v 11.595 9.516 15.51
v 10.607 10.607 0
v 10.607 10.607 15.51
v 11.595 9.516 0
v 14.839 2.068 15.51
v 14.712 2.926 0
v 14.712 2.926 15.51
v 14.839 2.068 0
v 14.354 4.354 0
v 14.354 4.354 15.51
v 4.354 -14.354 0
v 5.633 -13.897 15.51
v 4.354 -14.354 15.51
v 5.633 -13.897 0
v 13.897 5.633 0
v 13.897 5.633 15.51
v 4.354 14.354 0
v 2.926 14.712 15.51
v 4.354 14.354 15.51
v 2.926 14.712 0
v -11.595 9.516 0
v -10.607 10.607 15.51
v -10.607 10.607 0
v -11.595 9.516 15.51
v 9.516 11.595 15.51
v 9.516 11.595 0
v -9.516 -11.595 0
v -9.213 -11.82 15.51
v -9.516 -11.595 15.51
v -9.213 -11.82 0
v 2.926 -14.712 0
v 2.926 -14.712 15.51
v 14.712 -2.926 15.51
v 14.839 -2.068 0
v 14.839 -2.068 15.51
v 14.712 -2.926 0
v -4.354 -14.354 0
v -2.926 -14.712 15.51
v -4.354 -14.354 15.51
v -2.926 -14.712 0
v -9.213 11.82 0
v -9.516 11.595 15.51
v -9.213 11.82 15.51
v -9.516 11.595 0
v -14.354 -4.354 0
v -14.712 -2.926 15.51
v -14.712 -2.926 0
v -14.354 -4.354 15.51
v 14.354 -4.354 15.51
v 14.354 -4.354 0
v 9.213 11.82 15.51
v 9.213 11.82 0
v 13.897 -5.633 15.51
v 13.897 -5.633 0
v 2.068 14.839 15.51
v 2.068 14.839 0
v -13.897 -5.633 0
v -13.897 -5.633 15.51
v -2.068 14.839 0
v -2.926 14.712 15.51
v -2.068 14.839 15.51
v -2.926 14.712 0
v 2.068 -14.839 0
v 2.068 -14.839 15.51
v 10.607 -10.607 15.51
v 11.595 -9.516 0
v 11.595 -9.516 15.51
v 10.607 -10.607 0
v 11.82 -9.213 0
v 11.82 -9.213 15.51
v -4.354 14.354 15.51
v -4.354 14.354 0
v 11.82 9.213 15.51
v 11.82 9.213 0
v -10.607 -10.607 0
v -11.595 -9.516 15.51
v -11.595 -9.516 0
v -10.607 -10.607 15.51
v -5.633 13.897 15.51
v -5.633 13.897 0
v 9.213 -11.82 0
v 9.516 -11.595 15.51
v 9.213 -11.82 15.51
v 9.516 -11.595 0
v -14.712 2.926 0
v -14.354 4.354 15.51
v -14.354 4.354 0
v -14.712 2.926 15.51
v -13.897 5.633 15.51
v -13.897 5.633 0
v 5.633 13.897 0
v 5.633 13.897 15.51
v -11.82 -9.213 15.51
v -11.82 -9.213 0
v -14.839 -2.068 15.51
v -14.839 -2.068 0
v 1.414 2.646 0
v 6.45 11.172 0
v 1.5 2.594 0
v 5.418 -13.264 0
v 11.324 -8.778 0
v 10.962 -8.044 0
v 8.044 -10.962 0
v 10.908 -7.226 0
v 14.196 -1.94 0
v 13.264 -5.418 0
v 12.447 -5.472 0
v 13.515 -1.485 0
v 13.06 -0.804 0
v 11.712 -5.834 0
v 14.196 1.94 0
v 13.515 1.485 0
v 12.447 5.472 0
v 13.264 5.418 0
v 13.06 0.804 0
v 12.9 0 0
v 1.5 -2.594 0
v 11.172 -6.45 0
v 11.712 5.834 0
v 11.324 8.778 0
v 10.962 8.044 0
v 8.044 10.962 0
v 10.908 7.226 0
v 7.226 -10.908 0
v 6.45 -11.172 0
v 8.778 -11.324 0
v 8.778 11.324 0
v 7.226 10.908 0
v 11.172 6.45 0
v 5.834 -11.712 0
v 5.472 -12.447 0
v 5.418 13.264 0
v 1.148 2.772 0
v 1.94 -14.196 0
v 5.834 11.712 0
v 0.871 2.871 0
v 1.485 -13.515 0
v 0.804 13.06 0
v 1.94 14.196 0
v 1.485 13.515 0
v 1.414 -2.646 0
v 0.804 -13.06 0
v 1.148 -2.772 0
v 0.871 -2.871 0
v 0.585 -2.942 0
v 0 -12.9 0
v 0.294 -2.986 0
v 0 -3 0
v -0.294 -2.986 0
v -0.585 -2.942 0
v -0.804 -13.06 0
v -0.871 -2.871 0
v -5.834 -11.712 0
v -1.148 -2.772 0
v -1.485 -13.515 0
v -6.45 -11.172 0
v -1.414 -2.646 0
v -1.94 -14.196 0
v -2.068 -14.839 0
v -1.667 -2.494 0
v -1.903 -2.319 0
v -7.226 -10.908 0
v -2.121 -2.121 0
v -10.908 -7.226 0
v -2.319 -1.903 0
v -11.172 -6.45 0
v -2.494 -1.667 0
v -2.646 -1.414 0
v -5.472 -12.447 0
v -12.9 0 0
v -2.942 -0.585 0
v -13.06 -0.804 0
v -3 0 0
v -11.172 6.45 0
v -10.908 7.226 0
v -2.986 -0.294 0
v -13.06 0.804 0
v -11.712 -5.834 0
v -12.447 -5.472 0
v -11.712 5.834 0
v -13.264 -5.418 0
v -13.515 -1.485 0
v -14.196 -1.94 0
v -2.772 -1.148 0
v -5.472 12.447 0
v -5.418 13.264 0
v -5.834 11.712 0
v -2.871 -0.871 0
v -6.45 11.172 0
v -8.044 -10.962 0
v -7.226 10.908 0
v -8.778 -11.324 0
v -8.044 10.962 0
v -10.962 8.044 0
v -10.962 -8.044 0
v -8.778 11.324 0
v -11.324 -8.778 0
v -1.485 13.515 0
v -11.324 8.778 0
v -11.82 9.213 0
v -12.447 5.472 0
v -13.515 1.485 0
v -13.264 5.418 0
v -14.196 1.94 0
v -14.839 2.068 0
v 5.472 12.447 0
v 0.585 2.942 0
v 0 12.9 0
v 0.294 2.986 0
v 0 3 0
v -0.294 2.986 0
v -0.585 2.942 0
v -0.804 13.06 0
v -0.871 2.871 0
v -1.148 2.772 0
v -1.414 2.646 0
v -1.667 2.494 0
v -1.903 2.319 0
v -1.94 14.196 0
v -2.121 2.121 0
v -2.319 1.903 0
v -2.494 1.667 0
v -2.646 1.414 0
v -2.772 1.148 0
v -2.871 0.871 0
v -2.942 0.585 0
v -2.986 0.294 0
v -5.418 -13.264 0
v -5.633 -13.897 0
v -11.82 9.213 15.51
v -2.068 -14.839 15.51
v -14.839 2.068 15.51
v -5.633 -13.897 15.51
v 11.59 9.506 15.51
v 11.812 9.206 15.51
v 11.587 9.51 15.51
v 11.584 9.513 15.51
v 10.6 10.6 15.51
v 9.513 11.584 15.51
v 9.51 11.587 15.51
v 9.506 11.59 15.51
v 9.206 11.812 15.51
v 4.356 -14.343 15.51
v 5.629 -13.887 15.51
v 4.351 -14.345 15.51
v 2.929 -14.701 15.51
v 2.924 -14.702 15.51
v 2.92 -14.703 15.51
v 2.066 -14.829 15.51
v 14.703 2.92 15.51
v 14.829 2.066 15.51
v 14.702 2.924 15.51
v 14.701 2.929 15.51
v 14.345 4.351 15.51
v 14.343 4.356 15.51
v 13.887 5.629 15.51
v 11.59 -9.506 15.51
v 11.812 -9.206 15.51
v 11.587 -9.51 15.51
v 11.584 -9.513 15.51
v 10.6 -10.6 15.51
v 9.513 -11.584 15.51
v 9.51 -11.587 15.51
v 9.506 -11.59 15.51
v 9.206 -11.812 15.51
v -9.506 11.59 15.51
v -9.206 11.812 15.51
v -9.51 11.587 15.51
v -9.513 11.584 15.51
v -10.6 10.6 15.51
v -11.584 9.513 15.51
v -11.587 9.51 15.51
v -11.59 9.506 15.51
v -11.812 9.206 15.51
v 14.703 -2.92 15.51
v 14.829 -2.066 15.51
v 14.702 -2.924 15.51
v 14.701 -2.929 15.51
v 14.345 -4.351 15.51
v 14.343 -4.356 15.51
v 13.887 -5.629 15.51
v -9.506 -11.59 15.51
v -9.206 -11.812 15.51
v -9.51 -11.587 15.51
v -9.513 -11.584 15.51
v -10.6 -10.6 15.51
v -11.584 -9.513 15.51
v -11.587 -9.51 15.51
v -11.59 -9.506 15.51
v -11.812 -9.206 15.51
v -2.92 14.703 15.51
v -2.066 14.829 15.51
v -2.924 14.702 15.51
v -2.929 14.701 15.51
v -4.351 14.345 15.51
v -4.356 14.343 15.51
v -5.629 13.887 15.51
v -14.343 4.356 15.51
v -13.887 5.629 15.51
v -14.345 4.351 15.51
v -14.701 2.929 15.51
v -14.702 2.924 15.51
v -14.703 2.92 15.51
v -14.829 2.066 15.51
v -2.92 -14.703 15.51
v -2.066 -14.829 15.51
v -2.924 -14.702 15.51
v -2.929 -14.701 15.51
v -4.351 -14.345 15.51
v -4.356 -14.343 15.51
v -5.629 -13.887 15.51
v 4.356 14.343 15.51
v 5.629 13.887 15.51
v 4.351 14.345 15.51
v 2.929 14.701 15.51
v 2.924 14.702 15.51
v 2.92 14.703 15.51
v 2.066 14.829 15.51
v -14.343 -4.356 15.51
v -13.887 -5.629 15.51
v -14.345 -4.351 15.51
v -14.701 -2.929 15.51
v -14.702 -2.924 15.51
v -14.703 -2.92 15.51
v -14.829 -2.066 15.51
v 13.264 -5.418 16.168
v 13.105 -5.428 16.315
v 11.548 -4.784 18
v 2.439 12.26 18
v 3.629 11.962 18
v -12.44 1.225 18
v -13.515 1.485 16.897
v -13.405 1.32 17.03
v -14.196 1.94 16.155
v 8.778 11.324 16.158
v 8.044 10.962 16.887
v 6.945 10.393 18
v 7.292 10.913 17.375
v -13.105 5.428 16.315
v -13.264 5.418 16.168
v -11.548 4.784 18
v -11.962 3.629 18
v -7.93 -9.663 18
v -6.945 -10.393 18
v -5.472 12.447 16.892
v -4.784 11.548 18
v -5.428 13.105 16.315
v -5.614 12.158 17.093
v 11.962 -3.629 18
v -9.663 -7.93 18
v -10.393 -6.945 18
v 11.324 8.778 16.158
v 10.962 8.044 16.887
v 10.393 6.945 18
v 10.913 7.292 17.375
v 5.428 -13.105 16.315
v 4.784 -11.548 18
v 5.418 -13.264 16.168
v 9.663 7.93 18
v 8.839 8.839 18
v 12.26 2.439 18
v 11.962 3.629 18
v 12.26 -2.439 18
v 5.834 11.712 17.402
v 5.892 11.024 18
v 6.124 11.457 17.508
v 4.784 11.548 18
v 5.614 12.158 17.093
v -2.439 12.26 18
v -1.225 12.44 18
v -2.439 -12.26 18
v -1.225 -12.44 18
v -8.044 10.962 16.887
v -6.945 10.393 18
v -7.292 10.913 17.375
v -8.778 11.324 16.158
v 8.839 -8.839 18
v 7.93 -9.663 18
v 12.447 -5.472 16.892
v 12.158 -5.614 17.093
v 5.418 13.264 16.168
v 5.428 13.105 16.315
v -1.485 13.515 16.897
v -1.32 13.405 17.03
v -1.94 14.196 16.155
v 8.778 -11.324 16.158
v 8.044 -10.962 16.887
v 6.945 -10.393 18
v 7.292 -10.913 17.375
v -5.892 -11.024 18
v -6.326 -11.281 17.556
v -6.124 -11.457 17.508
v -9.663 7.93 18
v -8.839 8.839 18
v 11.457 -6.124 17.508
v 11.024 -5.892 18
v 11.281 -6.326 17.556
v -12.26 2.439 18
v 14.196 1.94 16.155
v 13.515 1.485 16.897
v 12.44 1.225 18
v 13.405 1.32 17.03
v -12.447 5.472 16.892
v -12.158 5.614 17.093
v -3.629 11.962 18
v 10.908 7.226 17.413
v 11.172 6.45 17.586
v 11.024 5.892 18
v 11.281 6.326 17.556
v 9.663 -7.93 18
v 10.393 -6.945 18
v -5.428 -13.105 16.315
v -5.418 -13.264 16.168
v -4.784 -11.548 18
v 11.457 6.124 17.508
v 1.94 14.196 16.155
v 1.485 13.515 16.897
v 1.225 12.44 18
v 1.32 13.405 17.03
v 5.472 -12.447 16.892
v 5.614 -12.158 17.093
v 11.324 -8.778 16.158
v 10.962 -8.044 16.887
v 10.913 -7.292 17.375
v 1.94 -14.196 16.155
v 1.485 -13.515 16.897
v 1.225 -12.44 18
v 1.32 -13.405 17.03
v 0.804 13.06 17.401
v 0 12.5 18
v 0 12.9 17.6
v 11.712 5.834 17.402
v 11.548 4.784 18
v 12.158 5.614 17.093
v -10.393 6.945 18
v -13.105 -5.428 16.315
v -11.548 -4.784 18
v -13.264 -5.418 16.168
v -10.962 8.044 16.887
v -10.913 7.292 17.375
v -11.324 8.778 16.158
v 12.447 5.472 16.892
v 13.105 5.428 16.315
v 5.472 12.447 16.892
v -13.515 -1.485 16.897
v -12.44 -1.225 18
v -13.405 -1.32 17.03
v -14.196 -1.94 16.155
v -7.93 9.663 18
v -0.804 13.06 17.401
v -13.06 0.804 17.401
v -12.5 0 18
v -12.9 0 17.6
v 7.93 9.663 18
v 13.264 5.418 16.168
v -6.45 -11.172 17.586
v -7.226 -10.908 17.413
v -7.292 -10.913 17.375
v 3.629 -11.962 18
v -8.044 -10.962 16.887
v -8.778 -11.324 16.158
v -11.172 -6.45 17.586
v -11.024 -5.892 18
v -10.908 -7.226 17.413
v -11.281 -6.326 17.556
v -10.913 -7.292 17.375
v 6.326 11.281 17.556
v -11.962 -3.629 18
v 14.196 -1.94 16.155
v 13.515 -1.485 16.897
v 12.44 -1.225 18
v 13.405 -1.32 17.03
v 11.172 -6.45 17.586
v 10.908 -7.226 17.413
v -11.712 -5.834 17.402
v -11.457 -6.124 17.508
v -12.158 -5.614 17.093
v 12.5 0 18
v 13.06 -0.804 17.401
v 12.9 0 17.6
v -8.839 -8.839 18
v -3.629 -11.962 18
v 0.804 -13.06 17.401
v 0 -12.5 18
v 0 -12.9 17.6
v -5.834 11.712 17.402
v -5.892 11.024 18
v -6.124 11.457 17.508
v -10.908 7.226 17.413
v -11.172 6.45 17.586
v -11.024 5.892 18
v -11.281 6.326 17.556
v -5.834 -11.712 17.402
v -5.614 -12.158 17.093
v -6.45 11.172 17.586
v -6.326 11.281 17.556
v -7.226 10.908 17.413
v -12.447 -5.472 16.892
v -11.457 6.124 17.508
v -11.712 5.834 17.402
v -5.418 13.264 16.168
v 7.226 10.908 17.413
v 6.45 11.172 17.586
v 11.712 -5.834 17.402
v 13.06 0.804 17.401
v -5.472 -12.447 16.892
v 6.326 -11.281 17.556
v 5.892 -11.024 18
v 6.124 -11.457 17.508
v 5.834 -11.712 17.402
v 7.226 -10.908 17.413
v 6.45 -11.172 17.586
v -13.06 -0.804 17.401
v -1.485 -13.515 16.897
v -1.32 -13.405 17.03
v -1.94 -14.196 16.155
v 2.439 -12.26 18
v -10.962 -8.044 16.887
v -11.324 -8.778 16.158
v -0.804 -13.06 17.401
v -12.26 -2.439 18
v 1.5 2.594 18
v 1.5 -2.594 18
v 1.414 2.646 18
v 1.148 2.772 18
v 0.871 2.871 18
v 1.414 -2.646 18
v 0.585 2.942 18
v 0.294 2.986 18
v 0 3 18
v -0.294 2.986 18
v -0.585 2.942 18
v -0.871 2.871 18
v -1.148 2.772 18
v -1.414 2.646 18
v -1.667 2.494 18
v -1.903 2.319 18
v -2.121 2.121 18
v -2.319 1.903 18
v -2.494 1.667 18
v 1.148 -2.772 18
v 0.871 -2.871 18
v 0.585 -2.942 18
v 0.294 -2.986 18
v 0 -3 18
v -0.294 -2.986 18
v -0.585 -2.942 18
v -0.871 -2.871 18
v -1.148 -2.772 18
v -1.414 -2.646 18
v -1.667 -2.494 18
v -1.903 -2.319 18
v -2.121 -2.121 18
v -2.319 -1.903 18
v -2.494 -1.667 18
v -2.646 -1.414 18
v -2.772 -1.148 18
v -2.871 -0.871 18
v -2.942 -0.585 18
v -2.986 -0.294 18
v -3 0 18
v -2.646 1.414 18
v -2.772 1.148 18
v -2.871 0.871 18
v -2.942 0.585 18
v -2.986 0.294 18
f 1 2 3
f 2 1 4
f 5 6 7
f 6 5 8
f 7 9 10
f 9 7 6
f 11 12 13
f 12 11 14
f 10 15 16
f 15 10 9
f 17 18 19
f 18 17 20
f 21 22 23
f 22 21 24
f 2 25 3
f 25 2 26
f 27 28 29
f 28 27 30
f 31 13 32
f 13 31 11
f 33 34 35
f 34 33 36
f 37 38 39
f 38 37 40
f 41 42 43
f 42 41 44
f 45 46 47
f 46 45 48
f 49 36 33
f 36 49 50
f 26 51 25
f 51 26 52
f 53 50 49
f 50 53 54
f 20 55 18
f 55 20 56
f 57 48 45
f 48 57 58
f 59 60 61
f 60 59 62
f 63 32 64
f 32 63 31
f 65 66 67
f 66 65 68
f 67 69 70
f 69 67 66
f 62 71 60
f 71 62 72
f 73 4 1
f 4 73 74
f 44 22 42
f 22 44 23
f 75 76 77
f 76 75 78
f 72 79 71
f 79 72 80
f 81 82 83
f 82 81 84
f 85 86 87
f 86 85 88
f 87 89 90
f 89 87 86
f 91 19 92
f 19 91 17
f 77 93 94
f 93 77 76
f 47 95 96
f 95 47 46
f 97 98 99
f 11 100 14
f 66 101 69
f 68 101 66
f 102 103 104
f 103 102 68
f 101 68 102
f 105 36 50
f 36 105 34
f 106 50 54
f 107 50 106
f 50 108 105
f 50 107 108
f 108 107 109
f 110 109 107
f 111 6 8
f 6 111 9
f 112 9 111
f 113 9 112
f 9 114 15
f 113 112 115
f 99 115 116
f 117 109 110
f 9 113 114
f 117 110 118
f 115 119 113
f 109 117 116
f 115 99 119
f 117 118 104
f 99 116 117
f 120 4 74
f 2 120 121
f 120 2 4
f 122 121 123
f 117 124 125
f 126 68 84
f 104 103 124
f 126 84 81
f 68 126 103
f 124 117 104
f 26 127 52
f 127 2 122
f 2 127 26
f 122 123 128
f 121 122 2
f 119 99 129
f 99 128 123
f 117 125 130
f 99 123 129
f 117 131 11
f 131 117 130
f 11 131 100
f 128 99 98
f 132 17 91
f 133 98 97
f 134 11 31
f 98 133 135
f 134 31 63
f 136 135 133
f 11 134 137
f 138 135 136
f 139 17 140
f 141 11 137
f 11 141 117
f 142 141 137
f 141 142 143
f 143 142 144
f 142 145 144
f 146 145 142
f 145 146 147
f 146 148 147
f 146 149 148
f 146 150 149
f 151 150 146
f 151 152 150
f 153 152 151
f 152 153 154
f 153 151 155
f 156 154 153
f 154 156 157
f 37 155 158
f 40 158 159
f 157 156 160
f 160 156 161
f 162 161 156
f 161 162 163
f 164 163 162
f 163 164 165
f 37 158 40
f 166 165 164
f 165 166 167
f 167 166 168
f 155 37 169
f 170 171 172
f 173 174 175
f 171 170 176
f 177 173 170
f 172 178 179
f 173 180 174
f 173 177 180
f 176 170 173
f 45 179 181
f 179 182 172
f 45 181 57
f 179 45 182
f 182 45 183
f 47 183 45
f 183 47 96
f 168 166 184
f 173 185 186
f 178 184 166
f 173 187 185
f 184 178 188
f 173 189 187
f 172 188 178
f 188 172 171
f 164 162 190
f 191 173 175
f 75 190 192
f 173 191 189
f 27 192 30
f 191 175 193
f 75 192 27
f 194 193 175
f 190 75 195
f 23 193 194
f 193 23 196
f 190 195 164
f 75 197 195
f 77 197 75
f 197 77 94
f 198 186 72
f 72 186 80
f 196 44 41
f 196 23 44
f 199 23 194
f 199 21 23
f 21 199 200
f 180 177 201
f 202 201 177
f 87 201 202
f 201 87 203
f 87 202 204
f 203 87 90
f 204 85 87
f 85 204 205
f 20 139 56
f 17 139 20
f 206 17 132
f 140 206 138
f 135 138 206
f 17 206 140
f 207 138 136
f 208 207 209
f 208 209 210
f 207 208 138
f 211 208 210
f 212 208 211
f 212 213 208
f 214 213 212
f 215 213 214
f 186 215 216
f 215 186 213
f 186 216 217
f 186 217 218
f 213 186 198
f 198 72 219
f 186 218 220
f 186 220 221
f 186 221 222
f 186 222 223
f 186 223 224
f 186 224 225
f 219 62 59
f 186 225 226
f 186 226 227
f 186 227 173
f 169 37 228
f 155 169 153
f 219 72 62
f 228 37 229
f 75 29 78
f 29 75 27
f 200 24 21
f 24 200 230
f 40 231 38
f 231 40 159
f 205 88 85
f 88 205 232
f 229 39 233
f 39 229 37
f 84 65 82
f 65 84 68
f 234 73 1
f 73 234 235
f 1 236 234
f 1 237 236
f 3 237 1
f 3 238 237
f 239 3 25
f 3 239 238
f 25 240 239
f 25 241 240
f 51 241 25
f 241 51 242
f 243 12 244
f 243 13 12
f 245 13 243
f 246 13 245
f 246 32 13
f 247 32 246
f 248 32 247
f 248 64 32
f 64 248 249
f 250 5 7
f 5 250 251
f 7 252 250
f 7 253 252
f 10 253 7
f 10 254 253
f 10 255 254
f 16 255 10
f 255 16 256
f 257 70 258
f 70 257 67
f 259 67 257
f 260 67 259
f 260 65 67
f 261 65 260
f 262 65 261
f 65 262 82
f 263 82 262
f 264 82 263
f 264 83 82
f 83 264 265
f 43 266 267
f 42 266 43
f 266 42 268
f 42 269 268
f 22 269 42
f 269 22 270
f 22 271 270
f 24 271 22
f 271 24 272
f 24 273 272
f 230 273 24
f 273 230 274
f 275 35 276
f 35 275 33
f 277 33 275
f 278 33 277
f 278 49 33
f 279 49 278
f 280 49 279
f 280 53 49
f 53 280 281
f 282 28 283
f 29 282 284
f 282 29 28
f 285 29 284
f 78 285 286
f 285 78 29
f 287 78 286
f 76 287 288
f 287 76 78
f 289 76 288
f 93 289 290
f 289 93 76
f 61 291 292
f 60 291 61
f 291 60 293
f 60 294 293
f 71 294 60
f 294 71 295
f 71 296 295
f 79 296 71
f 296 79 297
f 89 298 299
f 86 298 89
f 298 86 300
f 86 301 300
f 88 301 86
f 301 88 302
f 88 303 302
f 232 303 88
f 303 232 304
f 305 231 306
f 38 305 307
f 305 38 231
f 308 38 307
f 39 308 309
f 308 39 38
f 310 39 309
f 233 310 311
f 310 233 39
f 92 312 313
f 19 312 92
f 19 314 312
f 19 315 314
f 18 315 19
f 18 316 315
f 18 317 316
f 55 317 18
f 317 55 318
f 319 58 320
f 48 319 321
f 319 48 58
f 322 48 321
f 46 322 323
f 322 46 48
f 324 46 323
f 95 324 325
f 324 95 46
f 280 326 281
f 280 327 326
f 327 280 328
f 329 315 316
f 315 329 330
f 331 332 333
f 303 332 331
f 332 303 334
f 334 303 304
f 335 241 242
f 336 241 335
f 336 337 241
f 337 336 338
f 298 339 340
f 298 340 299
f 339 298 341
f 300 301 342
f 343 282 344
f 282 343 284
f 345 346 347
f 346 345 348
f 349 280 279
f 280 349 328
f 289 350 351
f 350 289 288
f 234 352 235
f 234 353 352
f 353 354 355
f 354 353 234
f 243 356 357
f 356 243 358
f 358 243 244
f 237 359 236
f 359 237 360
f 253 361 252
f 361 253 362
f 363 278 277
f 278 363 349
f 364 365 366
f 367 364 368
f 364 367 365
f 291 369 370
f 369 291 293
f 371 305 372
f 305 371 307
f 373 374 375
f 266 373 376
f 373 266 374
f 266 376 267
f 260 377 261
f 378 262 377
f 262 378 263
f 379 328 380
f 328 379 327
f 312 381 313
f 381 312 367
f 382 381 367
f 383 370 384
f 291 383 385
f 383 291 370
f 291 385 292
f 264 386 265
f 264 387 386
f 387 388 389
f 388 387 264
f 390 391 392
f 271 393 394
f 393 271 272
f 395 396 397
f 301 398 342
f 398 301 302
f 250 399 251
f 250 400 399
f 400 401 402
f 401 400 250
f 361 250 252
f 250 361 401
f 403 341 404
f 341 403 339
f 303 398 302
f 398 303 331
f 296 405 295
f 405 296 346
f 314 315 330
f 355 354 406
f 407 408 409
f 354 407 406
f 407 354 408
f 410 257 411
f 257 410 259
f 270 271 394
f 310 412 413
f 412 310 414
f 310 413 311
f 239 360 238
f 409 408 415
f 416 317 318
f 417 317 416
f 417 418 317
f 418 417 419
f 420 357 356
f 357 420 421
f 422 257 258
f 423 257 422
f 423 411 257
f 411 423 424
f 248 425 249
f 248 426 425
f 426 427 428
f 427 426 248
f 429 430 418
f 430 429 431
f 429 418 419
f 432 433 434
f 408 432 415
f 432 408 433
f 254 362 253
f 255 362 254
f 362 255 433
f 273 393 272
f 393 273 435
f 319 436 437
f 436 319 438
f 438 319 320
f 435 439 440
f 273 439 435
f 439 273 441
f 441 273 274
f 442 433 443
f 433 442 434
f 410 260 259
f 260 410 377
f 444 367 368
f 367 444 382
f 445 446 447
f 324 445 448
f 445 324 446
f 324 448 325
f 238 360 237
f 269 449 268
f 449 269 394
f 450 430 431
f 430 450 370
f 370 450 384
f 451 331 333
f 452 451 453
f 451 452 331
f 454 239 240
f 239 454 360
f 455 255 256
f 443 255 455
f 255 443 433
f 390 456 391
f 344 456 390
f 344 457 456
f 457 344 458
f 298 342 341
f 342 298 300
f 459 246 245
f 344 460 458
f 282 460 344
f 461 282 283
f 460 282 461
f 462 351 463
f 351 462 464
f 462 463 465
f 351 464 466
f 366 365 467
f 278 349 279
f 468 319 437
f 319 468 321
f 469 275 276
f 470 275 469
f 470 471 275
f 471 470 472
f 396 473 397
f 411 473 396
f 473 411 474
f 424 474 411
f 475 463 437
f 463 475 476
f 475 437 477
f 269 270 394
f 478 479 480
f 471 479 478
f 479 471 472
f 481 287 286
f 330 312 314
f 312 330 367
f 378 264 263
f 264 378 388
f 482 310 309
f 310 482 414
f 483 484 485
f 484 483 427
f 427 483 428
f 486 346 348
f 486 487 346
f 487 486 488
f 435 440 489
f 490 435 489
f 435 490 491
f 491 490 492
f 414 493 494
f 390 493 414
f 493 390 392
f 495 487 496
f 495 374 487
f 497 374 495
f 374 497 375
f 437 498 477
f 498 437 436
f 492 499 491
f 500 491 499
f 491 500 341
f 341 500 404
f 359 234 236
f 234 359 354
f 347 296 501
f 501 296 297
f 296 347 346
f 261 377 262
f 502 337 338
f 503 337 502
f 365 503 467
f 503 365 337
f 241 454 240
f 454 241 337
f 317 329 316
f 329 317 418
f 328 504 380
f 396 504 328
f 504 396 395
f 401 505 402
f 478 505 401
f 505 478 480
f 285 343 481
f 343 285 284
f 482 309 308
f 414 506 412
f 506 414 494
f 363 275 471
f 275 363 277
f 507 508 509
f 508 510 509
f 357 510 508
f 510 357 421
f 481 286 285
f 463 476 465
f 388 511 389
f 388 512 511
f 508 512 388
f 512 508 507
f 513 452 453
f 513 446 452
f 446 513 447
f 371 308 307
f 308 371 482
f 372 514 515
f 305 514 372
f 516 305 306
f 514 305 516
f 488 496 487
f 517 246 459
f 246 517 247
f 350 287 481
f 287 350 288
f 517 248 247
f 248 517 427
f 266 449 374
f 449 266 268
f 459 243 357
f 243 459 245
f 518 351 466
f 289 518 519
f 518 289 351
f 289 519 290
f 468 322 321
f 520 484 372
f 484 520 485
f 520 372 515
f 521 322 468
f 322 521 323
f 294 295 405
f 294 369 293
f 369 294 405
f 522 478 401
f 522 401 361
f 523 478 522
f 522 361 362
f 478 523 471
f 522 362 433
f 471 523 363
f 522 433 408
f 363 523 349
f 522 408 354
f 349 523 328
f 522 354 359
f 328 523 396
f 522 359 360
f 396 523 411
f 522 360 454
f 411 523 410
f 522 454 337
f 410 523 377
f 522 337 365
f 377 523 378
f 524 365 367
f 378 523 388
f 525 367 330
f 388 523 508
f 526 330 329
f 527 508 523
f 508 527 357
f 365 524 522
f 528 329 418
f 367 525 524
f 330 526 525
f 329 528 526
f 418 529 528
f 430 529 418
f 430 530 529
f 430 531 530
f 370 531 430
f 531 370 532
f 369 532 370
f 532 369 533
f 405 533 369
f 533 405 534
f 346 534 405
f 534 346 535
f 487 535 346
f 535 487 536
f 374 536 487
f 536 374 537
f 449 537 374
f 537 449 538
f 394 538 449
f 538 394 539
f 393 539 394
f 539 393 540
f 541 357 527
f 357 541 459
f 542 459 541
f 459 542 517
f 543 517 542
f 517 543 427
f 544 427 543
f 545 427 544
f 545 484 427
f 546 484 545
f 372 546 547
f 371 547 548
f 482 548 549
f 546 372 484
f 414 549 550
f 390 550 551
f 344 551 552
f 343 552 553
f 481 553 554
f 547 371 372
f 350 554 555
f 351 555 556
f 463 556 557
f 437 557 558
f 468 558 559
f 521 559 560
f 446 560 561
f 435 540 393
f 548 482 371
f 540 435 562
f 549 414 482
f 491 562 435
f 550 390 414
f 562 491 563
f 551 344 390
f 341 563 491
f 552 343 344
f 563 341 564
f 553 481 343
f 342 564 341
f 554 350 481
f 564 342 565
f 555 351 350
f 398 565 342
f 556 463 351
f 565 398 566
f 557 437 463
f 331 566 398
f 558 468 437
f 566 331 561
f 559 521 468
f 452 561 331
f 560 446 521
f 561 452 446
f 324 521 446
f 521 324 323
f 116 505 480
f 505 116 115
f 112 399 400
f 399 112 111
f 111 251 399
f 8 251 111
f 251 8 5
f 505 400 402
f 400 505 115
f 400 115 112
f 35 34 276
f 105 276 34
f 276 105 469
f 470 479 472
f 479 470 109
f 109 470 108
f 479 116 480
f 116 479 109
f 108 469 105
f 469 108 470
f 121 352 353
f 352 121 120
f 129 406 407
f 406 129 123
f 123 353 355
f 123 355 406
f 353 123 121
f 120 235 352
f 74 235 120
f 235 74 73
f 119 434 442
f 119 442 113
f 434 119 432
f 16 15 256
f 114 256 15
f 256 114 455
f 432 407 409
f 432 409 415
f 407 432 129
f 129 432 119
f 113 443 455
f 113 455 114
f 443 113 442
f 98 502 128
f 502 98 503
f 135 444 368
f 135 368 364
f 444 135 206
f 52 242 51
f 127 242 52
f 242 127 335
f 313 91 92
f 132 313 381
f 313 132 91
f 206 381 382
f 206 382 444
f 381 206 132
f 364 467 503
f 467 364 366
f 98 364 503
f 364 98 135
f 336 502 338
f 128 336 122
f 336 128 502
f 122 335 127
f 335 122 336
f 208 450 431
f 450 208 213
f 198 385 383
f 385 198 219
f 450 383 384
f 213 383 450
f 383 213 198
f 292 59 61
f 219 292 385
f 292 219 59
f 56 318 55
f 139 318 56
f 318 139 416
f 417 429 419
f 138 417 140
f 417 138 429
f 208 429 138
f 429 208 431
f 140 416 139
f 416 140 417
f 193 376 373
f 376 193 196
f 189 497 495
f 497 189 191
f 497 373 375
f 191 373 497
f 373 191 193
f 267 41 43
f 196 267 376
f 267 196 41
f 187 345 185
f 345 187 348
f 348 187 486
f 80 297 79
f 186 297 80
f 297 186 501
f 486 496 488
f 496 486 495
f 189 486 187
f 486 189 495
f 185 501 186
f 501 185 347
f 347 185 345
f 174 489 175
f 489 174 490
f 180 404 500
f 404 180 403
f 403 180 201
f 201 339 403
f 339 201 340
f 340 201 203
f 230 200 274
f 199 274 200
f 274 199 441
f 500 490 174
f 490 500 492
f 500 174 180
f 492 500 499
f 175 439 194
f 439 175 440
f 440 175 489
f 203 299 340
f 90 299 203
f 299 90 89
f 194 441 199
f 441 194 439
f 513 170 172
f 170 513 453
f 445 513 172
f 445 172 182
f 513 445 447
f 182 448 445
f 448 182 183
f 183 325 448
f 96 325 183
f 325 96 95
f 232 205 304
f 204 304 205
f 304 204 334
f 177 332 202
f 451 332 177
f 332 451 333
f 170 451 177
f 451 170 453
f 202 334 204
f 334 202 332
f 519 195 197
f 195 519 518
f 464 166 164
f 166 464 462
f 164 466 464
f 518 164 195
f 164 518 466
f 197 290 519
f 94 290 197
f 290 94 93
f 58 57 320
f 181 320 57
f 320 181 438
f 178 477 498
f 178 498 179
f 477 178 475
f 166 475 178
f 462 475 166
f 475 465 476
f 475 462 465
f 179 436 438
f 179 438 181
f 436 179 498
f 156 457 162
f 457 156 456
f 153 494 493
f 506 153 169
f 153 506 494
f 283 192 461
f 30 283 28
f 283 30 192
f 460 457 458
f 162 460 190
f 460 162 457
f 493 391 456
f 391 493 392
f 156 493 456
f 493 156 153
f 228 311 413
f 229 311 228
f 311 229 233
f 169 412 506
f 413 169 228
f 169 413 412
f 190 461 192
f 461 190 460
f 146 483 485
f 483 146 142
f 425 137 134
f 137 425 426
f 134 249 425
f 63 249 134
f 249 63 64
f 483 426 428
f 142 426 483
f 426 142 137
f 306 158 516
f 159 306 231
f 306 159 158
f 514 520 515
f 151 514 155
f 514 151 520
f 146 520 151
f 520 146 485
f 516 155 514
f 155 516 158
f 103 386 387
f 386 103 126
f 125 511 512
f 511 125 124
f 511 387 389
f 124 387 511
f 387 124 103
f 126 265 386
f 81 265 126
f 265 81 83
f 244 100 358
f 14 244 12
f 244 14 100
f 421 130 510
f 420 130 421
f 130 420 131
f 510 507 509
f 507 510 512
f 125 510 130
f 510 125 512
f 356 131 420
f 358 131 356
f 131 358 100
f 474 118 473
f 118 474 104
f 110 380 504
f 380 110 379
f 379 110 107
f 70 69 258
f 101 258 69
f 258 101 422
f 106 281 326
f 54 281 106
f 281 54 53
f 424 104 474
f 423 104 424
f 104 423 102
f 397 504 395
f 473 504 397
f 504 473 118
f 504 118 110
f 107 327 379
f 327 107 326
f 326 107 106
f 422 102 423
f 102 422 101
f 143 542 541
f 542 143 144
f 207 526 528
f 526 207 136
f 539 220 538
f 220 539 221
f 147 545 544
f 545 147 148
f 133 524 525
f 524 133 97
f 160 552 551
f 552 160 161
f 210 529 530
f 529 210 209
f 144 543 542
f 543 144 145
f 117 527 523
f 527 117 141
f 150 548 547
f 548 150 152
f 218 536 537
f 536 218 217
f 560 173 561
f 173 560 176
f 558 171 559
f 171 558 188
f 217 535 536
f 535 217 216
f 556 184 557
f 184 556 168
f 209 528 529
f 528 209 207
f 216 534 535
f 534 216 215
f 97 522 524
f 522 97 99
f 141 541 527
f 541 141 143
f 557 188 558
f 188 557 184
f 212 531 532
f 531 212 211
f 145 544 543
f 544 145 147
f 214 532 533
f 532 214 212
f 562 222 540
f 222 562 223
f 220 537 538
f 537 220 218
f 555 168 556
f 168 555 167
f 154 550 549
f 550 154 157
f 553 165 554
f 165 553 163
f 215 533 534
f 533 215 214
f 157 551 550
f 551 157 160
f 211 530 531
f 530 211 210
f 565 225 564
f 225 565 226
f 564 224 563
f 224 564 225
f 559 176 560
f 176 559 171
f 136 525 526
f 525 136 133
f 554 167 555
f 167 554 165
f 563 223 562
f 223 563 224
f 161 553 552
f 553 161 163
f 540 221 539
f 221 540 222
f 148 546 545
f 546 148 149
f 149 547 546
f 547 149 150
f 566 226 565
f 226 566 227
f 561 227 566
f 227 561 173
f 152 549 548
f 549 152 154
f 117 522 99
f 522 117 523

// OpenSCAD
// Knurled control knob - a cylindrical knob with a ring of grip flutes, a chamfered top edge, and a
// shaft bore with an optional flat (D-bore). Teaches a coarse surface texture, an edge chamfer, and
// a D-bore via intersection(). NOVEL general part.
//
// @desc fluted (knurled) knob with a chamfered top and a D-bore
// @prompt Design a control knob in OpenSCAD: {d} mm across and {h} mm tall with {flutes} grip flutes around the rim, a chamfered top edge, and a {bore} mm shaft bore with a flat {flat} mm deep. Reply with a single complete OpenSCAD file.
// @param d      knob diameter, mm      [18:50]
// @param h      knob height, mm        [12:30]
// @param flutes number of flutes       [8:18:1]
// @param bore   shaft bore, mm         [4:10]
// @param flat   shaft flat depth, mm   [0:3]

d      = 30;
h      = 18;
flutes = 12;
bore   = 6;
flat   = 1.5;

$fn = 64;

chamf = min(2.5, h / 4);
fd    = d * 0.14;                 // flute-cutter diameter
fl    = min(flat, bore / 2 - 0.8); // keep the D-flat shallower than the bore radius

difference() {
    union() {
        cylinder(h = h - chamf + 0.01, d = d);                                          // body
        translate([0, 0, h - chamf]) cylinder(h = chamf, d1 = d, d2 = d - 2 * chamf);   // chamfered top
    }
    for (i = [0 : flutes - 1])                                                           // grip flutes
        rotate([0, 0, i * 360 / flutes])
            translate([d / 2, 0, -1]) cylinder(h = h + 2, d = fd, $fn = 16);
    translate([0, 0, -1]) intersection() {                                              // shaft bore, D-flat on +x
        cylinder(h = h + 2, d = bore);
        translate([-d, -d, 0]) cube([d + bore / 2 - fl, 2 * d, h + 2]);
    }
}
